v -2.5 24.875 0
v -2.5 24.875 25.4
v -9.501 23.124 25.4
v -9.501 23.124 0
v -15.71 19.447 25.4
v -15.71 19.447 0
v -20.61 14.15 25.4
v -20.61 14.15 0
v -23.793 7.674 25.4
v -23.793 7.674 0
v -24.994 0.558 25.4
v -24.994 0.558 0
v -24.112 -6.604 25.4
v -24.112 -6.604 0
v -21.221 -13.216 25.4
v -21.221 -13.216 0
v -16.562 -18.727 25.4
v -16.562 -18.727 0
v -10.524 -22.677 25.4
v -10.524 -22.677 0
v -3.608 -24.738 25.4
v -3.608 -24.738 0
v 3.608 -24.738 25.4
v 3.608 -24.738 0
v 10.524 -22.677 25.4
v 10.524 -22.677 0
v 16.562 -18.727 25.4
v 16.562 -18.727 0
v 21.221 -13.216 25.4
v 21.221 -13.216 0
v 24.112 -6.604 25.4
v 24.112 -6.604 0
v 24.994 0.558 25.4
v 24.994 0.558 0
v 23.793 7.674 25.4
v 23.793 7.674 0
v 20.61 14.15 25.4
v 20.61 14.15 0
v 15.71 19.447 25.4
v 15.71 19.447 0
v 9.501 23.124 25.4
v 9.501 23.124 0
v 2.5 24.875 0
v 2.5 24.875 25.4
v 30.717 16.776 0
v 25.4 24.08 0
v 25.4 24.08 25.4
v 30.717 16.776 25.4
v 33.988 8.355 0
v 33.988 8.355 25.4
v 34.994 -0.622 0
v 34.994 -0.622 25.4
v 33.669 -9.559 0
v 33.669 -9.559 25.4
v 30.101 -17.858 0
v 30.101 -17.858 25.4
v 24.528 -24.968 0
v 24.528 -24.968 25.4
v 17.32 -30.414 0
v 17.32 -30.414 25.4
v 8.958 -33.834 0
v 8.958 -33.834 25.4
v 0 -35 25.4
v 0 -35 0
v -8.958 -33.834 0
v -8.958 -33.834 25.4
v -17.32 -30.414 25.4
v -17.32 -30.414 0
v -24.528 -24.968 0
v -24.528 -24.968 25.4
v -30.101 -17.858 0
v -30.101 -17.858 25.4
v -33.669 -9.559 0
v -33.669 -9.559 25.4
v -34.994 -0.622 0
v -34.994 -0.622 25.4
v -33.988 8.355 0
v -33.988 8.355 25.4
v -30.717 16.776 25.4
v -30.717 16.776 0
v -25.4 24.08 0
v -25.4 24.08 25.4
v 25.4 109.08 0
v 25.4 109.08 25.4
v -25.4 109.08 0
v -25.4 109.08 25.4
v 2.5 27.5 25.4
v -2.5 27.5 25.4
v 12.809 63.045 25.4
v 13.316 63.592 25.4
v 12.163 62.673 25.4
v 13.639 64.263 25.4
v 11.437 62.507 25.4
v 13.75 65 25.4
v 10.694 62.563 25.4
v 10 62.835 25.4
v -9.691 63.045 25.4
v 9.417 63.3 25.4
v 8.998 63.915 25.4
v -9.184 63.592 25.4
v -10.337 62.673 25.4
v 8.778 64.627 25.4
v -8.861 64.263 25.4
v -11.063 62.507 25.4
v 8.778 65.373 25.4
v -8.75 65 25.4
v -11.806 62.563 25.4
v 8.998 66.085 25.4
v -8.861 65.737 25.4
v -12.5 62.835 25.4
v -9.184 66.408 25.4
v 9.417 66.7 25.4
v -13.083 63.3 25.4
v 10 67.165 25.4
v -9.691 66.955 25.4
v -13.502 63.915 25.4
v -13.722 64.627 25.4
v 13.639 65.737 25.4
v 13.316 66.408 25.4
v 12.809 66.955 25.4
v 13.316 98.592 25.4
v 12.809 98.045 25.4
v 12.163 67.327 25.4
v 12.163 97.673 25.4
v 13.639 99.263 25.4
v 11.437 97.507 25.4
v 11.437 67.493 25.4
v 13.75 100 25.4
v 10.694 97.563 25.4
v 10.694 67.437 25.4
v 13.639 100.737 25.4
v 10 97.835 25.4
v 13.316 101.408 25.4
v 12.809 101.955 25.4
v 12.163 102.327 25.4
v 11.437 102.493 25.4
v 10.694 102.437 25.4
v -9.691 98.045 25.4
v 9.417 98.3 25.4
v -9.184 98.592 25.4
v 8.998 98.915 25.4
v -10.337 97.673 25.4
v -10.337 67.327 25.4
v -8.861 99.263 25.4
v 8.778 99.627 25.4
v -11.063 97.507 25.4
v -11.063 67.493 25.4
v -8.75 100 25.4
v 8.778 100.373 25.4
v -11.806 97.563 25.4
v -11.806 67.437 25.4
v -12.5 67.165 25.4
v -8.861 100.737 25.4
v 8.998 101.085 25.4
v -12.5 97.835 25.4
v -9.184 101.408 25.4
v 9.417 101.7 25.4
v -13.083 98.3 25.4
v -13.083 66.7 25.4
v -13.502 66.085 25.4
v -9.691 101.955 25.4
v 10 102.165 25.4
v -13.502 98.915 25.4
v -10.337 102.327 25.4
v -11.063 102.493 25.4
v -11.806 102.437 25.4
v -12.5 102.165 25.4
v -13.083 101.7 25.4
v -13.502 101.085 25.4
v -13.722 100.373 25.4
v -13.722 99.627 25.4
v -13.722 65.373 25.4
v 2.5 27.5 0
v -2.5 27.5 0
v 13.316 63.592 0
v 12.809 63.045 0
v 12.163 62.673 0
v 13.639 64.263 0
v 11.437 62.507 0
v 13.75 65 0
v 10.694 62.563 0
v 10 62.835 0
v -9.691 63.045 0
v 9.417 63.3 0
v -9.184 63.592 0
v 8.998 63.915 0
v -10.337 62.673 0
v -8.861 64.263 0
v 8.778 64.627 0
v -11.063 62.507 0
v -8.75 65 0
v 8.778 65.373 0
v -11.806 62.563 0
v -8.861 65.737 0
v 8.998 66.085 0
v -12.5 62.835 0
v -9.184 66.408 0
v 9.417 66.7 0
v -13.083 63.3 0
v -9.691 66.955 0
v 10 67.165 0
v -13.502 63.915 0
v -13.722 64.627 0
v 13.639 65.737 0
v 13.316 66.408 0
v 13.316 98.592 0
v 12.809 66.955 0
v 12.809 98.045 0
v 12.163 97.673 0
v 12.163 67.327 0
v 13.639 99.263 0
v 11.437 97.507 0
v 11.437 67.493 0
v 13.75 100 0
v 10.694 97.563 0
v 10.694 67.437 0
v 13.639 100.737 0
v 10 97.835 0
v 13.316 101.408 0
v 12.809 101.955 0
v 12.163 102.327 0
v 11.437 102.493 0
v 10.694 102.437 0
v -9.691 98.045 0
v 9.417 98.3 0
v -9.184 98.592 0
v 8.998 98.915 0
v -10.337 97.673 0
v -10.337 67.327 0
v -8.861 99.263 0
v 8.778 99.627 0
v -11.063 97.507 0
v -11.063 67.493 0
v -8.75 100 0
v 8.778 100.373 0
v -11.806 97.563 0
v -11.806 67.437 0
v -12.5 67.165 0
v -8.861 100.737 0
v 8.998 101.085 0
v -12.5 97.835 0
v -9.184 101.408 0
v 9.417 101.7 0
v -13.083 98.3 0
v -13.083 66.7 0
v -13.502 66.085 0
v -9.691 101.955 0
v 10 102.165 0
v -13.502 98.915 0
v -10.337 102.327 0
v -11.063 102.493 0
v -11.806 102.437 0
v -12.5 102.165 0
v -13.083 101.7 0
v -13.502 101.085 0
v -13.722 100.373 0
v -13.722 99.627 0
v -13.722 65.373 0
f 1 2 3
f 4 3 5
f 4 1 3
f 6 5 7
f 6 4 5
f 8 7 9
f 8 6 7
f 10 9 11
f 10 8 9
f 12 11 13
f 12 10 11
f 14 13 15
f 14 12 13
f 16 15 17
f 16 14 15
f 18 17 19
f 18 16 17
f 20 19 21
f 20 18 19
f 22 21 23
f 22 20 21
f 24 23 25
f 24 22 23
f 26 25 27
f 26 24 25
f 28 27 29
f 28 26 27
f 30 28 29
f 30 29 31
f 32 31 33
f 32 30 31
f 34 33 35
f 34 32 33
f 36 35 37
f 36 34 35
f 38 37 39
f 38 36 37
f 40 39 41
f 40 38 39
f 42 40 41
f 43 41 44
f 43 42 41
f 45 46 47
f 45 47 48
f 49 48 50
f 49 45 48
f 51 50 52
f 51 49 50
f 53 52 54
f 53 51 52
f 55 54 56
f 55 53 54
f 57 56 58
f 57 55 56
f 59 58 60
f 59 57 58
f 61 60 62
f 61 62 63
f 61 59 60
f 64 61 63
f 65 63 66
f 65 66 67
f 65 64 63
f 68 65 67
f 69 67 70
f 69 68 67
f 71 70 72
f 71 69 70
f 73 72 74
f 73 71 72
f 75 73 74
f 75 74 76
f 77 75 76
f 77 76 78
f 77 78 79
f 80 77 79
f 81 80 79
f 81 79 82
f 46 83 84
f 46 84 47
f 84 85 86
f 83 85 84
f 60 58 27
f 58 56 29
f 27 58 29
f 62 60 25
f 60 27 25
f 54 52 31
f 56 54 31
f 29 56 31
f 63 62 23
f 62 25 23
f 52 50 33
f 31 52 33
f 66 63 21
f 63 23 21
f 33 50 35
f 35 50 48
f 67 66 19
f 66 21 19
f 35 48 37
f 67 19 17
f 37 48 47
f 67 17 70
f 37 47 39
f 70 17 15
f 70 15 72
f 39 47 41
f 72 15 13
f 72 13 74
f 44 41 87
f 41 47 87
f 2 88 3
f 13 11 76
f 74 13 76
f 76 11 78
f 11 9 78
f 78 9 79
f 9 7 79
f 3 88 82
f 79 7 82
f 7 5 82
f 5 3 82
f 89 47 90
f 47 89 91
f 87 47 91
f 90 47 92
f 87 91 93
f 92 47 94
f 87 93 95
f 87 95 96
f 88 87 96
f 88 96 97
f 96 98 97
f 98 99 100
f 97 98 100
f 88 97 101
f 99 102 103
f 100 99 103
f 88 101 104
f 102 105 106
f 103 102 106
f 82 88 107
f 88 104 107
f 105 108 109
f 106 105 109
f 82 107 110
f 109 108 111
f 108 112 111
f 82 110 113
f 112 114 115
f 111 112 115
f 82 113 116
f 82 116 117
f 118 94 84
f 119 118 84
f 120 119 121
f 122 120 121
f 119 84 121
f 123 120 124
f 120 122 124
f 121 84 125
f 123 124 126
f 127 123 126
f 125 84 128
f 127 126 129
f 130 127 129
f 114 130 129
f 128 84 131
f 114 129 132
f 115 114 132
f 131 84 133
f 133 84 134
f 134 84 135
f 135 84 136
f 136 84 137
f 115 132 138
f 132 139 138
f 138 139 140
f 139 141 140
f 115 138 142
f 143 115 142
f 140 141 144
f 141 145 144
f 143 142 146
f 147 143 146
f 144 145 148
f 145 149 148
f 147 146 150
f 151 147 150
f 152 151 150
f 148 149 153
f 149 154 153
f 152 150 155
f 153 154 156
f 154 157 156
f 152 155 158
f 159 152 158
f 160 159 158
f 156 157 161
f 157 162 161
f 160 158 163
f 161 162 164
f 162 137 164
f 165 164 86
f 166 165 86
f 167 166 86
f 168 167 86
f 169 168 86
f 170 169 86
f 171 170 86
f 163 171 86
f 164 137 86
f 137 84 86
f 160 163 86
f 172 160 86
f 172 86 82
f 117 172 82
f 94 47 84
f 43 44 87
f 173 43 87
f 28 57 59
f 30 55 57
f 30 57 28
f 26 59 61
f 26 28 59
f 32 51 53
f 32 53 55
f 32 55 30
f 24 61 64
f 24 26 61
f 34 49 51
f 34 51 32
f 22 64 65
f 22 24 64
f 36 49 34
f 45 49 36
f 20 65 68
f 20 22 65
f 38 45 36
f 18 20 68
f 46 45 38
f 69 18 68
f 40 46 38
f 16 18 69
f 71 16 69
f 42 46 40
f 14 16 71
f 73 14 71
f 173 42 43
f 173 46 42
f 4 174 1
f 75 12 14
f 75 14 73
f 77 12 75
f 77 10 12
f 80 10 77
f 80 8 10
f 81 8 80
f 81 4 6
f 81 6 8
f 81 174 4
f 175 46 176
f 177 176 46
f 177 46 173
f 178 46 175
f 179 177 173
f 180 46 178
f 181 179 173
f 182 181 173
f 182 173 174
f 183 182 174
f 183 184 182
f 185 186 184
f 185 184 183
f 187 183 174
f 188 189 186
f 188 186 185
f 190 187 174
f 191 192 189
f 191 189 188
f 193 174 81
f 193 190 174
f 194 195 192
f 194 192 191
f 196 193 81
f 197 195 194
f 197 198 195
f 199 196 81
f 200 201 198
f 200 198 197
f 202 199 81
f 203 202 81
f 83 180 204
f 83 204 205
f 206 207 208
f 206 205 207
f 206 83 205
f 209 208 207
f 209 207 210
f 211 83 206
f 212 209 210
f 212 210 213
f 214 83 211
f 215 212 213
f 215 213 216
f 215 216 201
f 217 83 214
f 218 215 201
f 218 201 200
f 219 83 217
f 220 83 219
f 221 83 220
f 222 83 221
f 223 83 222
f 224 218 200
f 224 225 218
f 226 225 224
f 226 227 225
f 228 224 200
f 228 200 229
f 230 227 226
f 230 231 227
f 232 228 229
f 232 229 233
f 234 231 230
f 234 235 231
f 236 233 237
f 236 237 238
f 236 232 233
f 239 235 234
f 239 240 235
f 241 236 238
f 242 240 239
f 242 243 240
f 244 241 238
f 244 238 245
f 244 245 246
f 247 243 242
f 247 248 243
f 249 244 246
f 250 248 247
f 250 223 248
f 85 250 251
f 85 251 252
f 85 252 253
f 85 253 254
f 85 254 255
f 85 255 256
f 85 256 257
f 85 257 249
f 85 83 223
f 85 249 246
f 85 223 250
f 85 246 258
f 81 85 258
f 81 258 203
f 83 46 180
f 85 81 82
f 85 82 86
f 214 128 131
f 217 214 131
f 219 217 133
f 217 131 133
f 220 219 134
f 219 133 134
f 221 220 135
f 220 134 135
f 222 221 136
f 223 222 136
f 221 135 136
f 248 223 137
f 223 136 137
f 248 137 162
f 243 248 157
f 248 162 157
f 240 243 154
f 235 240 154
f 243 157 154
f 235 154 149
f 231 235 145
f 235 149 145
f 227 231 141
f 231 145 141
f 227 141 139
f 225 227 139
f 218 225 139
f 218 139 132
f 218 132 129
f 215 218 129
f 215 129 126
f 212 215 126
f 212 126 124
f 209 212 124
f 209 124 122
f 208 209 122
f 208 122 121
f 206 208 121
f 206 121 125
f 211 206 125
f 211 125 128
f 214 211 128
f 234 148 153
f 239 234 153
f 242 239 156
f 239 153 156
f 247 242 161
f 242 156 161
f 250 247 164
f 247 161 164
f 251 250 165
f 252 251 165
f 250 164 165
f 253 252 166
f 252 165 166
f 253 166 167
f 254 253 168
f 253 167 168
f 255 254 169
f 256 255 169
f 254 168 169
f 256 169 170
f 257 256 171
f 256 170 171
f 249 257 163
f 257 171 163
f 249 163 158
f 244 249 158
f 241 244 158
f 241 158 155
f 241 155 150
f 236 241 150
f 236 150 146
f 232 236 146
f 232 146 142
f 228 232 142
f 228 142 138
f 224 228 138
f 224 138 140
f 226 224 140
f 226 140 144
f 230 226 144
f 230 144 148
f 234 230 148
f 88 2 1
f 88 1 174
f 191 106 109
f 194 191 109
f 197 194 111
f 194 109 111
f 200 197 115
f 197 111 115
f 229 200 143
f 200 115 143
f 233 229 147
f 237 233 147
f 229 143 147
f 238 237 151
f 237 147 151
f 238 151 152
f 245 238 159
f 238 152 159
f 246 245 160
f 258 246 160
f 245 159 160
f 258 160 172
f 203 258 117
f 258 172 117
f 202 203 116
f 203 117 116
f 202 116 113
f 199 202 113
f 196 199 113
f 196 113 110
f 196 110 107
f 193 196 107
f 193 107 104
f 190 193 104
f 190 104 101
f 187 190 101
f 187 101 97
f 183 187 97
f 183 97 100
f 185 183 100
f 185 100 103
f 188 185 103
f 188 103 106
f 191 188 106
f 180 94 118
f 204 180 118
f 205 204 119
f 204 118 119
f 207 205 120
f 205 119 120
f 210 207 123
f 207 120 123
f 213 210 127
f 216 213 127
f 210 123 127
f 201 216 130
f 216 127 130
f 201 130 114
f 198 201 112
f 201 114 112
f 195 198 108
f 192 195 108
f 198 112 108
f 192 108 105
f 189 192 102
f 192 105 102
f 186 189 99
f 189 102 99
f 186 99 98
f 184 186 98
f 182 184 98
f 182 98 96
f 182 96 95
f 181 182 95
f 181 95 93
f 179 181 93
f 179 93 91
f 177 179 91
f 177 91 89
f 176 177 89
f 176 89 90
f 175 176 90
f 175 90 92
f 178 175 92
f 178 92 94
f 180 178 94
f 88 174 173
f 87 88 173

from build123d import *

# Parameters (mm, degrees)
SKETCH1_R           = 25
BOSS_EXTRUDE1_DEPTH = 25.4
SKETCH2_W           = 5
SKETCH2_H           = 27.5
CUT_EXTRUDE1_DEPTH  = 118.339581594
SKETCH3_R           = 2.5
CUT_EXTRUDE2_DEPTH  = 118.339581594


with BuildPart() as part:
    # Sketch1 → Boss-Extrude1 (new body)
    with BuildSketch(Plane.XY):
        with BuildLine():
            Line((-25.4, 24.079867109), (-25.4, 109.079867109))
            Line((-25.4, 109.079867109), (25.4, 109.079867109))
            Line((25.4, 109.079867109), (25.4, 24.079867109))
            ThreePointArc((25.4, 24.079867109), (0, -35), (-25.4, 24.079867109))
        make_face()
        Circle(SKETCH1_R, mode=Mode.SUBTRACT)
    extrude(amount=BOSS_EXTRUDE1_DEPTH)

    # Sketch2 → Cut-Extrude1 (cut, through all)
    with BuildSketch(Plane.XY.offset(25.4)):
        with Locations((0, 13.75)):
            Rectangle(SKETCH2_W, SKETCH2_H)
    extrude(amount=-CUT_EXTRUDE1_DEPTH, mode=Mode.SUBTRACT)

    # Sketch3 → Cut-Extrude2 (cut, through all)
    with BuildSketch(Plane.XY.offset(25.4)):
        with Locations((-11.25, 100)):
            Circle(SKETCH3_R)
        with Locations((11.25, 100)):
            Circle(SKETCH3_R)
        with Locations((11.25, 65)):
            Circle(SKETCH3_R)
        with Locations((-11.25, 65)):
            Circle(SKETCH3_R)
    extrude(amount=-CUT_EXTRUDE2_DEPTH, mode=Mode.SUBTRACT)


solid = part.part
